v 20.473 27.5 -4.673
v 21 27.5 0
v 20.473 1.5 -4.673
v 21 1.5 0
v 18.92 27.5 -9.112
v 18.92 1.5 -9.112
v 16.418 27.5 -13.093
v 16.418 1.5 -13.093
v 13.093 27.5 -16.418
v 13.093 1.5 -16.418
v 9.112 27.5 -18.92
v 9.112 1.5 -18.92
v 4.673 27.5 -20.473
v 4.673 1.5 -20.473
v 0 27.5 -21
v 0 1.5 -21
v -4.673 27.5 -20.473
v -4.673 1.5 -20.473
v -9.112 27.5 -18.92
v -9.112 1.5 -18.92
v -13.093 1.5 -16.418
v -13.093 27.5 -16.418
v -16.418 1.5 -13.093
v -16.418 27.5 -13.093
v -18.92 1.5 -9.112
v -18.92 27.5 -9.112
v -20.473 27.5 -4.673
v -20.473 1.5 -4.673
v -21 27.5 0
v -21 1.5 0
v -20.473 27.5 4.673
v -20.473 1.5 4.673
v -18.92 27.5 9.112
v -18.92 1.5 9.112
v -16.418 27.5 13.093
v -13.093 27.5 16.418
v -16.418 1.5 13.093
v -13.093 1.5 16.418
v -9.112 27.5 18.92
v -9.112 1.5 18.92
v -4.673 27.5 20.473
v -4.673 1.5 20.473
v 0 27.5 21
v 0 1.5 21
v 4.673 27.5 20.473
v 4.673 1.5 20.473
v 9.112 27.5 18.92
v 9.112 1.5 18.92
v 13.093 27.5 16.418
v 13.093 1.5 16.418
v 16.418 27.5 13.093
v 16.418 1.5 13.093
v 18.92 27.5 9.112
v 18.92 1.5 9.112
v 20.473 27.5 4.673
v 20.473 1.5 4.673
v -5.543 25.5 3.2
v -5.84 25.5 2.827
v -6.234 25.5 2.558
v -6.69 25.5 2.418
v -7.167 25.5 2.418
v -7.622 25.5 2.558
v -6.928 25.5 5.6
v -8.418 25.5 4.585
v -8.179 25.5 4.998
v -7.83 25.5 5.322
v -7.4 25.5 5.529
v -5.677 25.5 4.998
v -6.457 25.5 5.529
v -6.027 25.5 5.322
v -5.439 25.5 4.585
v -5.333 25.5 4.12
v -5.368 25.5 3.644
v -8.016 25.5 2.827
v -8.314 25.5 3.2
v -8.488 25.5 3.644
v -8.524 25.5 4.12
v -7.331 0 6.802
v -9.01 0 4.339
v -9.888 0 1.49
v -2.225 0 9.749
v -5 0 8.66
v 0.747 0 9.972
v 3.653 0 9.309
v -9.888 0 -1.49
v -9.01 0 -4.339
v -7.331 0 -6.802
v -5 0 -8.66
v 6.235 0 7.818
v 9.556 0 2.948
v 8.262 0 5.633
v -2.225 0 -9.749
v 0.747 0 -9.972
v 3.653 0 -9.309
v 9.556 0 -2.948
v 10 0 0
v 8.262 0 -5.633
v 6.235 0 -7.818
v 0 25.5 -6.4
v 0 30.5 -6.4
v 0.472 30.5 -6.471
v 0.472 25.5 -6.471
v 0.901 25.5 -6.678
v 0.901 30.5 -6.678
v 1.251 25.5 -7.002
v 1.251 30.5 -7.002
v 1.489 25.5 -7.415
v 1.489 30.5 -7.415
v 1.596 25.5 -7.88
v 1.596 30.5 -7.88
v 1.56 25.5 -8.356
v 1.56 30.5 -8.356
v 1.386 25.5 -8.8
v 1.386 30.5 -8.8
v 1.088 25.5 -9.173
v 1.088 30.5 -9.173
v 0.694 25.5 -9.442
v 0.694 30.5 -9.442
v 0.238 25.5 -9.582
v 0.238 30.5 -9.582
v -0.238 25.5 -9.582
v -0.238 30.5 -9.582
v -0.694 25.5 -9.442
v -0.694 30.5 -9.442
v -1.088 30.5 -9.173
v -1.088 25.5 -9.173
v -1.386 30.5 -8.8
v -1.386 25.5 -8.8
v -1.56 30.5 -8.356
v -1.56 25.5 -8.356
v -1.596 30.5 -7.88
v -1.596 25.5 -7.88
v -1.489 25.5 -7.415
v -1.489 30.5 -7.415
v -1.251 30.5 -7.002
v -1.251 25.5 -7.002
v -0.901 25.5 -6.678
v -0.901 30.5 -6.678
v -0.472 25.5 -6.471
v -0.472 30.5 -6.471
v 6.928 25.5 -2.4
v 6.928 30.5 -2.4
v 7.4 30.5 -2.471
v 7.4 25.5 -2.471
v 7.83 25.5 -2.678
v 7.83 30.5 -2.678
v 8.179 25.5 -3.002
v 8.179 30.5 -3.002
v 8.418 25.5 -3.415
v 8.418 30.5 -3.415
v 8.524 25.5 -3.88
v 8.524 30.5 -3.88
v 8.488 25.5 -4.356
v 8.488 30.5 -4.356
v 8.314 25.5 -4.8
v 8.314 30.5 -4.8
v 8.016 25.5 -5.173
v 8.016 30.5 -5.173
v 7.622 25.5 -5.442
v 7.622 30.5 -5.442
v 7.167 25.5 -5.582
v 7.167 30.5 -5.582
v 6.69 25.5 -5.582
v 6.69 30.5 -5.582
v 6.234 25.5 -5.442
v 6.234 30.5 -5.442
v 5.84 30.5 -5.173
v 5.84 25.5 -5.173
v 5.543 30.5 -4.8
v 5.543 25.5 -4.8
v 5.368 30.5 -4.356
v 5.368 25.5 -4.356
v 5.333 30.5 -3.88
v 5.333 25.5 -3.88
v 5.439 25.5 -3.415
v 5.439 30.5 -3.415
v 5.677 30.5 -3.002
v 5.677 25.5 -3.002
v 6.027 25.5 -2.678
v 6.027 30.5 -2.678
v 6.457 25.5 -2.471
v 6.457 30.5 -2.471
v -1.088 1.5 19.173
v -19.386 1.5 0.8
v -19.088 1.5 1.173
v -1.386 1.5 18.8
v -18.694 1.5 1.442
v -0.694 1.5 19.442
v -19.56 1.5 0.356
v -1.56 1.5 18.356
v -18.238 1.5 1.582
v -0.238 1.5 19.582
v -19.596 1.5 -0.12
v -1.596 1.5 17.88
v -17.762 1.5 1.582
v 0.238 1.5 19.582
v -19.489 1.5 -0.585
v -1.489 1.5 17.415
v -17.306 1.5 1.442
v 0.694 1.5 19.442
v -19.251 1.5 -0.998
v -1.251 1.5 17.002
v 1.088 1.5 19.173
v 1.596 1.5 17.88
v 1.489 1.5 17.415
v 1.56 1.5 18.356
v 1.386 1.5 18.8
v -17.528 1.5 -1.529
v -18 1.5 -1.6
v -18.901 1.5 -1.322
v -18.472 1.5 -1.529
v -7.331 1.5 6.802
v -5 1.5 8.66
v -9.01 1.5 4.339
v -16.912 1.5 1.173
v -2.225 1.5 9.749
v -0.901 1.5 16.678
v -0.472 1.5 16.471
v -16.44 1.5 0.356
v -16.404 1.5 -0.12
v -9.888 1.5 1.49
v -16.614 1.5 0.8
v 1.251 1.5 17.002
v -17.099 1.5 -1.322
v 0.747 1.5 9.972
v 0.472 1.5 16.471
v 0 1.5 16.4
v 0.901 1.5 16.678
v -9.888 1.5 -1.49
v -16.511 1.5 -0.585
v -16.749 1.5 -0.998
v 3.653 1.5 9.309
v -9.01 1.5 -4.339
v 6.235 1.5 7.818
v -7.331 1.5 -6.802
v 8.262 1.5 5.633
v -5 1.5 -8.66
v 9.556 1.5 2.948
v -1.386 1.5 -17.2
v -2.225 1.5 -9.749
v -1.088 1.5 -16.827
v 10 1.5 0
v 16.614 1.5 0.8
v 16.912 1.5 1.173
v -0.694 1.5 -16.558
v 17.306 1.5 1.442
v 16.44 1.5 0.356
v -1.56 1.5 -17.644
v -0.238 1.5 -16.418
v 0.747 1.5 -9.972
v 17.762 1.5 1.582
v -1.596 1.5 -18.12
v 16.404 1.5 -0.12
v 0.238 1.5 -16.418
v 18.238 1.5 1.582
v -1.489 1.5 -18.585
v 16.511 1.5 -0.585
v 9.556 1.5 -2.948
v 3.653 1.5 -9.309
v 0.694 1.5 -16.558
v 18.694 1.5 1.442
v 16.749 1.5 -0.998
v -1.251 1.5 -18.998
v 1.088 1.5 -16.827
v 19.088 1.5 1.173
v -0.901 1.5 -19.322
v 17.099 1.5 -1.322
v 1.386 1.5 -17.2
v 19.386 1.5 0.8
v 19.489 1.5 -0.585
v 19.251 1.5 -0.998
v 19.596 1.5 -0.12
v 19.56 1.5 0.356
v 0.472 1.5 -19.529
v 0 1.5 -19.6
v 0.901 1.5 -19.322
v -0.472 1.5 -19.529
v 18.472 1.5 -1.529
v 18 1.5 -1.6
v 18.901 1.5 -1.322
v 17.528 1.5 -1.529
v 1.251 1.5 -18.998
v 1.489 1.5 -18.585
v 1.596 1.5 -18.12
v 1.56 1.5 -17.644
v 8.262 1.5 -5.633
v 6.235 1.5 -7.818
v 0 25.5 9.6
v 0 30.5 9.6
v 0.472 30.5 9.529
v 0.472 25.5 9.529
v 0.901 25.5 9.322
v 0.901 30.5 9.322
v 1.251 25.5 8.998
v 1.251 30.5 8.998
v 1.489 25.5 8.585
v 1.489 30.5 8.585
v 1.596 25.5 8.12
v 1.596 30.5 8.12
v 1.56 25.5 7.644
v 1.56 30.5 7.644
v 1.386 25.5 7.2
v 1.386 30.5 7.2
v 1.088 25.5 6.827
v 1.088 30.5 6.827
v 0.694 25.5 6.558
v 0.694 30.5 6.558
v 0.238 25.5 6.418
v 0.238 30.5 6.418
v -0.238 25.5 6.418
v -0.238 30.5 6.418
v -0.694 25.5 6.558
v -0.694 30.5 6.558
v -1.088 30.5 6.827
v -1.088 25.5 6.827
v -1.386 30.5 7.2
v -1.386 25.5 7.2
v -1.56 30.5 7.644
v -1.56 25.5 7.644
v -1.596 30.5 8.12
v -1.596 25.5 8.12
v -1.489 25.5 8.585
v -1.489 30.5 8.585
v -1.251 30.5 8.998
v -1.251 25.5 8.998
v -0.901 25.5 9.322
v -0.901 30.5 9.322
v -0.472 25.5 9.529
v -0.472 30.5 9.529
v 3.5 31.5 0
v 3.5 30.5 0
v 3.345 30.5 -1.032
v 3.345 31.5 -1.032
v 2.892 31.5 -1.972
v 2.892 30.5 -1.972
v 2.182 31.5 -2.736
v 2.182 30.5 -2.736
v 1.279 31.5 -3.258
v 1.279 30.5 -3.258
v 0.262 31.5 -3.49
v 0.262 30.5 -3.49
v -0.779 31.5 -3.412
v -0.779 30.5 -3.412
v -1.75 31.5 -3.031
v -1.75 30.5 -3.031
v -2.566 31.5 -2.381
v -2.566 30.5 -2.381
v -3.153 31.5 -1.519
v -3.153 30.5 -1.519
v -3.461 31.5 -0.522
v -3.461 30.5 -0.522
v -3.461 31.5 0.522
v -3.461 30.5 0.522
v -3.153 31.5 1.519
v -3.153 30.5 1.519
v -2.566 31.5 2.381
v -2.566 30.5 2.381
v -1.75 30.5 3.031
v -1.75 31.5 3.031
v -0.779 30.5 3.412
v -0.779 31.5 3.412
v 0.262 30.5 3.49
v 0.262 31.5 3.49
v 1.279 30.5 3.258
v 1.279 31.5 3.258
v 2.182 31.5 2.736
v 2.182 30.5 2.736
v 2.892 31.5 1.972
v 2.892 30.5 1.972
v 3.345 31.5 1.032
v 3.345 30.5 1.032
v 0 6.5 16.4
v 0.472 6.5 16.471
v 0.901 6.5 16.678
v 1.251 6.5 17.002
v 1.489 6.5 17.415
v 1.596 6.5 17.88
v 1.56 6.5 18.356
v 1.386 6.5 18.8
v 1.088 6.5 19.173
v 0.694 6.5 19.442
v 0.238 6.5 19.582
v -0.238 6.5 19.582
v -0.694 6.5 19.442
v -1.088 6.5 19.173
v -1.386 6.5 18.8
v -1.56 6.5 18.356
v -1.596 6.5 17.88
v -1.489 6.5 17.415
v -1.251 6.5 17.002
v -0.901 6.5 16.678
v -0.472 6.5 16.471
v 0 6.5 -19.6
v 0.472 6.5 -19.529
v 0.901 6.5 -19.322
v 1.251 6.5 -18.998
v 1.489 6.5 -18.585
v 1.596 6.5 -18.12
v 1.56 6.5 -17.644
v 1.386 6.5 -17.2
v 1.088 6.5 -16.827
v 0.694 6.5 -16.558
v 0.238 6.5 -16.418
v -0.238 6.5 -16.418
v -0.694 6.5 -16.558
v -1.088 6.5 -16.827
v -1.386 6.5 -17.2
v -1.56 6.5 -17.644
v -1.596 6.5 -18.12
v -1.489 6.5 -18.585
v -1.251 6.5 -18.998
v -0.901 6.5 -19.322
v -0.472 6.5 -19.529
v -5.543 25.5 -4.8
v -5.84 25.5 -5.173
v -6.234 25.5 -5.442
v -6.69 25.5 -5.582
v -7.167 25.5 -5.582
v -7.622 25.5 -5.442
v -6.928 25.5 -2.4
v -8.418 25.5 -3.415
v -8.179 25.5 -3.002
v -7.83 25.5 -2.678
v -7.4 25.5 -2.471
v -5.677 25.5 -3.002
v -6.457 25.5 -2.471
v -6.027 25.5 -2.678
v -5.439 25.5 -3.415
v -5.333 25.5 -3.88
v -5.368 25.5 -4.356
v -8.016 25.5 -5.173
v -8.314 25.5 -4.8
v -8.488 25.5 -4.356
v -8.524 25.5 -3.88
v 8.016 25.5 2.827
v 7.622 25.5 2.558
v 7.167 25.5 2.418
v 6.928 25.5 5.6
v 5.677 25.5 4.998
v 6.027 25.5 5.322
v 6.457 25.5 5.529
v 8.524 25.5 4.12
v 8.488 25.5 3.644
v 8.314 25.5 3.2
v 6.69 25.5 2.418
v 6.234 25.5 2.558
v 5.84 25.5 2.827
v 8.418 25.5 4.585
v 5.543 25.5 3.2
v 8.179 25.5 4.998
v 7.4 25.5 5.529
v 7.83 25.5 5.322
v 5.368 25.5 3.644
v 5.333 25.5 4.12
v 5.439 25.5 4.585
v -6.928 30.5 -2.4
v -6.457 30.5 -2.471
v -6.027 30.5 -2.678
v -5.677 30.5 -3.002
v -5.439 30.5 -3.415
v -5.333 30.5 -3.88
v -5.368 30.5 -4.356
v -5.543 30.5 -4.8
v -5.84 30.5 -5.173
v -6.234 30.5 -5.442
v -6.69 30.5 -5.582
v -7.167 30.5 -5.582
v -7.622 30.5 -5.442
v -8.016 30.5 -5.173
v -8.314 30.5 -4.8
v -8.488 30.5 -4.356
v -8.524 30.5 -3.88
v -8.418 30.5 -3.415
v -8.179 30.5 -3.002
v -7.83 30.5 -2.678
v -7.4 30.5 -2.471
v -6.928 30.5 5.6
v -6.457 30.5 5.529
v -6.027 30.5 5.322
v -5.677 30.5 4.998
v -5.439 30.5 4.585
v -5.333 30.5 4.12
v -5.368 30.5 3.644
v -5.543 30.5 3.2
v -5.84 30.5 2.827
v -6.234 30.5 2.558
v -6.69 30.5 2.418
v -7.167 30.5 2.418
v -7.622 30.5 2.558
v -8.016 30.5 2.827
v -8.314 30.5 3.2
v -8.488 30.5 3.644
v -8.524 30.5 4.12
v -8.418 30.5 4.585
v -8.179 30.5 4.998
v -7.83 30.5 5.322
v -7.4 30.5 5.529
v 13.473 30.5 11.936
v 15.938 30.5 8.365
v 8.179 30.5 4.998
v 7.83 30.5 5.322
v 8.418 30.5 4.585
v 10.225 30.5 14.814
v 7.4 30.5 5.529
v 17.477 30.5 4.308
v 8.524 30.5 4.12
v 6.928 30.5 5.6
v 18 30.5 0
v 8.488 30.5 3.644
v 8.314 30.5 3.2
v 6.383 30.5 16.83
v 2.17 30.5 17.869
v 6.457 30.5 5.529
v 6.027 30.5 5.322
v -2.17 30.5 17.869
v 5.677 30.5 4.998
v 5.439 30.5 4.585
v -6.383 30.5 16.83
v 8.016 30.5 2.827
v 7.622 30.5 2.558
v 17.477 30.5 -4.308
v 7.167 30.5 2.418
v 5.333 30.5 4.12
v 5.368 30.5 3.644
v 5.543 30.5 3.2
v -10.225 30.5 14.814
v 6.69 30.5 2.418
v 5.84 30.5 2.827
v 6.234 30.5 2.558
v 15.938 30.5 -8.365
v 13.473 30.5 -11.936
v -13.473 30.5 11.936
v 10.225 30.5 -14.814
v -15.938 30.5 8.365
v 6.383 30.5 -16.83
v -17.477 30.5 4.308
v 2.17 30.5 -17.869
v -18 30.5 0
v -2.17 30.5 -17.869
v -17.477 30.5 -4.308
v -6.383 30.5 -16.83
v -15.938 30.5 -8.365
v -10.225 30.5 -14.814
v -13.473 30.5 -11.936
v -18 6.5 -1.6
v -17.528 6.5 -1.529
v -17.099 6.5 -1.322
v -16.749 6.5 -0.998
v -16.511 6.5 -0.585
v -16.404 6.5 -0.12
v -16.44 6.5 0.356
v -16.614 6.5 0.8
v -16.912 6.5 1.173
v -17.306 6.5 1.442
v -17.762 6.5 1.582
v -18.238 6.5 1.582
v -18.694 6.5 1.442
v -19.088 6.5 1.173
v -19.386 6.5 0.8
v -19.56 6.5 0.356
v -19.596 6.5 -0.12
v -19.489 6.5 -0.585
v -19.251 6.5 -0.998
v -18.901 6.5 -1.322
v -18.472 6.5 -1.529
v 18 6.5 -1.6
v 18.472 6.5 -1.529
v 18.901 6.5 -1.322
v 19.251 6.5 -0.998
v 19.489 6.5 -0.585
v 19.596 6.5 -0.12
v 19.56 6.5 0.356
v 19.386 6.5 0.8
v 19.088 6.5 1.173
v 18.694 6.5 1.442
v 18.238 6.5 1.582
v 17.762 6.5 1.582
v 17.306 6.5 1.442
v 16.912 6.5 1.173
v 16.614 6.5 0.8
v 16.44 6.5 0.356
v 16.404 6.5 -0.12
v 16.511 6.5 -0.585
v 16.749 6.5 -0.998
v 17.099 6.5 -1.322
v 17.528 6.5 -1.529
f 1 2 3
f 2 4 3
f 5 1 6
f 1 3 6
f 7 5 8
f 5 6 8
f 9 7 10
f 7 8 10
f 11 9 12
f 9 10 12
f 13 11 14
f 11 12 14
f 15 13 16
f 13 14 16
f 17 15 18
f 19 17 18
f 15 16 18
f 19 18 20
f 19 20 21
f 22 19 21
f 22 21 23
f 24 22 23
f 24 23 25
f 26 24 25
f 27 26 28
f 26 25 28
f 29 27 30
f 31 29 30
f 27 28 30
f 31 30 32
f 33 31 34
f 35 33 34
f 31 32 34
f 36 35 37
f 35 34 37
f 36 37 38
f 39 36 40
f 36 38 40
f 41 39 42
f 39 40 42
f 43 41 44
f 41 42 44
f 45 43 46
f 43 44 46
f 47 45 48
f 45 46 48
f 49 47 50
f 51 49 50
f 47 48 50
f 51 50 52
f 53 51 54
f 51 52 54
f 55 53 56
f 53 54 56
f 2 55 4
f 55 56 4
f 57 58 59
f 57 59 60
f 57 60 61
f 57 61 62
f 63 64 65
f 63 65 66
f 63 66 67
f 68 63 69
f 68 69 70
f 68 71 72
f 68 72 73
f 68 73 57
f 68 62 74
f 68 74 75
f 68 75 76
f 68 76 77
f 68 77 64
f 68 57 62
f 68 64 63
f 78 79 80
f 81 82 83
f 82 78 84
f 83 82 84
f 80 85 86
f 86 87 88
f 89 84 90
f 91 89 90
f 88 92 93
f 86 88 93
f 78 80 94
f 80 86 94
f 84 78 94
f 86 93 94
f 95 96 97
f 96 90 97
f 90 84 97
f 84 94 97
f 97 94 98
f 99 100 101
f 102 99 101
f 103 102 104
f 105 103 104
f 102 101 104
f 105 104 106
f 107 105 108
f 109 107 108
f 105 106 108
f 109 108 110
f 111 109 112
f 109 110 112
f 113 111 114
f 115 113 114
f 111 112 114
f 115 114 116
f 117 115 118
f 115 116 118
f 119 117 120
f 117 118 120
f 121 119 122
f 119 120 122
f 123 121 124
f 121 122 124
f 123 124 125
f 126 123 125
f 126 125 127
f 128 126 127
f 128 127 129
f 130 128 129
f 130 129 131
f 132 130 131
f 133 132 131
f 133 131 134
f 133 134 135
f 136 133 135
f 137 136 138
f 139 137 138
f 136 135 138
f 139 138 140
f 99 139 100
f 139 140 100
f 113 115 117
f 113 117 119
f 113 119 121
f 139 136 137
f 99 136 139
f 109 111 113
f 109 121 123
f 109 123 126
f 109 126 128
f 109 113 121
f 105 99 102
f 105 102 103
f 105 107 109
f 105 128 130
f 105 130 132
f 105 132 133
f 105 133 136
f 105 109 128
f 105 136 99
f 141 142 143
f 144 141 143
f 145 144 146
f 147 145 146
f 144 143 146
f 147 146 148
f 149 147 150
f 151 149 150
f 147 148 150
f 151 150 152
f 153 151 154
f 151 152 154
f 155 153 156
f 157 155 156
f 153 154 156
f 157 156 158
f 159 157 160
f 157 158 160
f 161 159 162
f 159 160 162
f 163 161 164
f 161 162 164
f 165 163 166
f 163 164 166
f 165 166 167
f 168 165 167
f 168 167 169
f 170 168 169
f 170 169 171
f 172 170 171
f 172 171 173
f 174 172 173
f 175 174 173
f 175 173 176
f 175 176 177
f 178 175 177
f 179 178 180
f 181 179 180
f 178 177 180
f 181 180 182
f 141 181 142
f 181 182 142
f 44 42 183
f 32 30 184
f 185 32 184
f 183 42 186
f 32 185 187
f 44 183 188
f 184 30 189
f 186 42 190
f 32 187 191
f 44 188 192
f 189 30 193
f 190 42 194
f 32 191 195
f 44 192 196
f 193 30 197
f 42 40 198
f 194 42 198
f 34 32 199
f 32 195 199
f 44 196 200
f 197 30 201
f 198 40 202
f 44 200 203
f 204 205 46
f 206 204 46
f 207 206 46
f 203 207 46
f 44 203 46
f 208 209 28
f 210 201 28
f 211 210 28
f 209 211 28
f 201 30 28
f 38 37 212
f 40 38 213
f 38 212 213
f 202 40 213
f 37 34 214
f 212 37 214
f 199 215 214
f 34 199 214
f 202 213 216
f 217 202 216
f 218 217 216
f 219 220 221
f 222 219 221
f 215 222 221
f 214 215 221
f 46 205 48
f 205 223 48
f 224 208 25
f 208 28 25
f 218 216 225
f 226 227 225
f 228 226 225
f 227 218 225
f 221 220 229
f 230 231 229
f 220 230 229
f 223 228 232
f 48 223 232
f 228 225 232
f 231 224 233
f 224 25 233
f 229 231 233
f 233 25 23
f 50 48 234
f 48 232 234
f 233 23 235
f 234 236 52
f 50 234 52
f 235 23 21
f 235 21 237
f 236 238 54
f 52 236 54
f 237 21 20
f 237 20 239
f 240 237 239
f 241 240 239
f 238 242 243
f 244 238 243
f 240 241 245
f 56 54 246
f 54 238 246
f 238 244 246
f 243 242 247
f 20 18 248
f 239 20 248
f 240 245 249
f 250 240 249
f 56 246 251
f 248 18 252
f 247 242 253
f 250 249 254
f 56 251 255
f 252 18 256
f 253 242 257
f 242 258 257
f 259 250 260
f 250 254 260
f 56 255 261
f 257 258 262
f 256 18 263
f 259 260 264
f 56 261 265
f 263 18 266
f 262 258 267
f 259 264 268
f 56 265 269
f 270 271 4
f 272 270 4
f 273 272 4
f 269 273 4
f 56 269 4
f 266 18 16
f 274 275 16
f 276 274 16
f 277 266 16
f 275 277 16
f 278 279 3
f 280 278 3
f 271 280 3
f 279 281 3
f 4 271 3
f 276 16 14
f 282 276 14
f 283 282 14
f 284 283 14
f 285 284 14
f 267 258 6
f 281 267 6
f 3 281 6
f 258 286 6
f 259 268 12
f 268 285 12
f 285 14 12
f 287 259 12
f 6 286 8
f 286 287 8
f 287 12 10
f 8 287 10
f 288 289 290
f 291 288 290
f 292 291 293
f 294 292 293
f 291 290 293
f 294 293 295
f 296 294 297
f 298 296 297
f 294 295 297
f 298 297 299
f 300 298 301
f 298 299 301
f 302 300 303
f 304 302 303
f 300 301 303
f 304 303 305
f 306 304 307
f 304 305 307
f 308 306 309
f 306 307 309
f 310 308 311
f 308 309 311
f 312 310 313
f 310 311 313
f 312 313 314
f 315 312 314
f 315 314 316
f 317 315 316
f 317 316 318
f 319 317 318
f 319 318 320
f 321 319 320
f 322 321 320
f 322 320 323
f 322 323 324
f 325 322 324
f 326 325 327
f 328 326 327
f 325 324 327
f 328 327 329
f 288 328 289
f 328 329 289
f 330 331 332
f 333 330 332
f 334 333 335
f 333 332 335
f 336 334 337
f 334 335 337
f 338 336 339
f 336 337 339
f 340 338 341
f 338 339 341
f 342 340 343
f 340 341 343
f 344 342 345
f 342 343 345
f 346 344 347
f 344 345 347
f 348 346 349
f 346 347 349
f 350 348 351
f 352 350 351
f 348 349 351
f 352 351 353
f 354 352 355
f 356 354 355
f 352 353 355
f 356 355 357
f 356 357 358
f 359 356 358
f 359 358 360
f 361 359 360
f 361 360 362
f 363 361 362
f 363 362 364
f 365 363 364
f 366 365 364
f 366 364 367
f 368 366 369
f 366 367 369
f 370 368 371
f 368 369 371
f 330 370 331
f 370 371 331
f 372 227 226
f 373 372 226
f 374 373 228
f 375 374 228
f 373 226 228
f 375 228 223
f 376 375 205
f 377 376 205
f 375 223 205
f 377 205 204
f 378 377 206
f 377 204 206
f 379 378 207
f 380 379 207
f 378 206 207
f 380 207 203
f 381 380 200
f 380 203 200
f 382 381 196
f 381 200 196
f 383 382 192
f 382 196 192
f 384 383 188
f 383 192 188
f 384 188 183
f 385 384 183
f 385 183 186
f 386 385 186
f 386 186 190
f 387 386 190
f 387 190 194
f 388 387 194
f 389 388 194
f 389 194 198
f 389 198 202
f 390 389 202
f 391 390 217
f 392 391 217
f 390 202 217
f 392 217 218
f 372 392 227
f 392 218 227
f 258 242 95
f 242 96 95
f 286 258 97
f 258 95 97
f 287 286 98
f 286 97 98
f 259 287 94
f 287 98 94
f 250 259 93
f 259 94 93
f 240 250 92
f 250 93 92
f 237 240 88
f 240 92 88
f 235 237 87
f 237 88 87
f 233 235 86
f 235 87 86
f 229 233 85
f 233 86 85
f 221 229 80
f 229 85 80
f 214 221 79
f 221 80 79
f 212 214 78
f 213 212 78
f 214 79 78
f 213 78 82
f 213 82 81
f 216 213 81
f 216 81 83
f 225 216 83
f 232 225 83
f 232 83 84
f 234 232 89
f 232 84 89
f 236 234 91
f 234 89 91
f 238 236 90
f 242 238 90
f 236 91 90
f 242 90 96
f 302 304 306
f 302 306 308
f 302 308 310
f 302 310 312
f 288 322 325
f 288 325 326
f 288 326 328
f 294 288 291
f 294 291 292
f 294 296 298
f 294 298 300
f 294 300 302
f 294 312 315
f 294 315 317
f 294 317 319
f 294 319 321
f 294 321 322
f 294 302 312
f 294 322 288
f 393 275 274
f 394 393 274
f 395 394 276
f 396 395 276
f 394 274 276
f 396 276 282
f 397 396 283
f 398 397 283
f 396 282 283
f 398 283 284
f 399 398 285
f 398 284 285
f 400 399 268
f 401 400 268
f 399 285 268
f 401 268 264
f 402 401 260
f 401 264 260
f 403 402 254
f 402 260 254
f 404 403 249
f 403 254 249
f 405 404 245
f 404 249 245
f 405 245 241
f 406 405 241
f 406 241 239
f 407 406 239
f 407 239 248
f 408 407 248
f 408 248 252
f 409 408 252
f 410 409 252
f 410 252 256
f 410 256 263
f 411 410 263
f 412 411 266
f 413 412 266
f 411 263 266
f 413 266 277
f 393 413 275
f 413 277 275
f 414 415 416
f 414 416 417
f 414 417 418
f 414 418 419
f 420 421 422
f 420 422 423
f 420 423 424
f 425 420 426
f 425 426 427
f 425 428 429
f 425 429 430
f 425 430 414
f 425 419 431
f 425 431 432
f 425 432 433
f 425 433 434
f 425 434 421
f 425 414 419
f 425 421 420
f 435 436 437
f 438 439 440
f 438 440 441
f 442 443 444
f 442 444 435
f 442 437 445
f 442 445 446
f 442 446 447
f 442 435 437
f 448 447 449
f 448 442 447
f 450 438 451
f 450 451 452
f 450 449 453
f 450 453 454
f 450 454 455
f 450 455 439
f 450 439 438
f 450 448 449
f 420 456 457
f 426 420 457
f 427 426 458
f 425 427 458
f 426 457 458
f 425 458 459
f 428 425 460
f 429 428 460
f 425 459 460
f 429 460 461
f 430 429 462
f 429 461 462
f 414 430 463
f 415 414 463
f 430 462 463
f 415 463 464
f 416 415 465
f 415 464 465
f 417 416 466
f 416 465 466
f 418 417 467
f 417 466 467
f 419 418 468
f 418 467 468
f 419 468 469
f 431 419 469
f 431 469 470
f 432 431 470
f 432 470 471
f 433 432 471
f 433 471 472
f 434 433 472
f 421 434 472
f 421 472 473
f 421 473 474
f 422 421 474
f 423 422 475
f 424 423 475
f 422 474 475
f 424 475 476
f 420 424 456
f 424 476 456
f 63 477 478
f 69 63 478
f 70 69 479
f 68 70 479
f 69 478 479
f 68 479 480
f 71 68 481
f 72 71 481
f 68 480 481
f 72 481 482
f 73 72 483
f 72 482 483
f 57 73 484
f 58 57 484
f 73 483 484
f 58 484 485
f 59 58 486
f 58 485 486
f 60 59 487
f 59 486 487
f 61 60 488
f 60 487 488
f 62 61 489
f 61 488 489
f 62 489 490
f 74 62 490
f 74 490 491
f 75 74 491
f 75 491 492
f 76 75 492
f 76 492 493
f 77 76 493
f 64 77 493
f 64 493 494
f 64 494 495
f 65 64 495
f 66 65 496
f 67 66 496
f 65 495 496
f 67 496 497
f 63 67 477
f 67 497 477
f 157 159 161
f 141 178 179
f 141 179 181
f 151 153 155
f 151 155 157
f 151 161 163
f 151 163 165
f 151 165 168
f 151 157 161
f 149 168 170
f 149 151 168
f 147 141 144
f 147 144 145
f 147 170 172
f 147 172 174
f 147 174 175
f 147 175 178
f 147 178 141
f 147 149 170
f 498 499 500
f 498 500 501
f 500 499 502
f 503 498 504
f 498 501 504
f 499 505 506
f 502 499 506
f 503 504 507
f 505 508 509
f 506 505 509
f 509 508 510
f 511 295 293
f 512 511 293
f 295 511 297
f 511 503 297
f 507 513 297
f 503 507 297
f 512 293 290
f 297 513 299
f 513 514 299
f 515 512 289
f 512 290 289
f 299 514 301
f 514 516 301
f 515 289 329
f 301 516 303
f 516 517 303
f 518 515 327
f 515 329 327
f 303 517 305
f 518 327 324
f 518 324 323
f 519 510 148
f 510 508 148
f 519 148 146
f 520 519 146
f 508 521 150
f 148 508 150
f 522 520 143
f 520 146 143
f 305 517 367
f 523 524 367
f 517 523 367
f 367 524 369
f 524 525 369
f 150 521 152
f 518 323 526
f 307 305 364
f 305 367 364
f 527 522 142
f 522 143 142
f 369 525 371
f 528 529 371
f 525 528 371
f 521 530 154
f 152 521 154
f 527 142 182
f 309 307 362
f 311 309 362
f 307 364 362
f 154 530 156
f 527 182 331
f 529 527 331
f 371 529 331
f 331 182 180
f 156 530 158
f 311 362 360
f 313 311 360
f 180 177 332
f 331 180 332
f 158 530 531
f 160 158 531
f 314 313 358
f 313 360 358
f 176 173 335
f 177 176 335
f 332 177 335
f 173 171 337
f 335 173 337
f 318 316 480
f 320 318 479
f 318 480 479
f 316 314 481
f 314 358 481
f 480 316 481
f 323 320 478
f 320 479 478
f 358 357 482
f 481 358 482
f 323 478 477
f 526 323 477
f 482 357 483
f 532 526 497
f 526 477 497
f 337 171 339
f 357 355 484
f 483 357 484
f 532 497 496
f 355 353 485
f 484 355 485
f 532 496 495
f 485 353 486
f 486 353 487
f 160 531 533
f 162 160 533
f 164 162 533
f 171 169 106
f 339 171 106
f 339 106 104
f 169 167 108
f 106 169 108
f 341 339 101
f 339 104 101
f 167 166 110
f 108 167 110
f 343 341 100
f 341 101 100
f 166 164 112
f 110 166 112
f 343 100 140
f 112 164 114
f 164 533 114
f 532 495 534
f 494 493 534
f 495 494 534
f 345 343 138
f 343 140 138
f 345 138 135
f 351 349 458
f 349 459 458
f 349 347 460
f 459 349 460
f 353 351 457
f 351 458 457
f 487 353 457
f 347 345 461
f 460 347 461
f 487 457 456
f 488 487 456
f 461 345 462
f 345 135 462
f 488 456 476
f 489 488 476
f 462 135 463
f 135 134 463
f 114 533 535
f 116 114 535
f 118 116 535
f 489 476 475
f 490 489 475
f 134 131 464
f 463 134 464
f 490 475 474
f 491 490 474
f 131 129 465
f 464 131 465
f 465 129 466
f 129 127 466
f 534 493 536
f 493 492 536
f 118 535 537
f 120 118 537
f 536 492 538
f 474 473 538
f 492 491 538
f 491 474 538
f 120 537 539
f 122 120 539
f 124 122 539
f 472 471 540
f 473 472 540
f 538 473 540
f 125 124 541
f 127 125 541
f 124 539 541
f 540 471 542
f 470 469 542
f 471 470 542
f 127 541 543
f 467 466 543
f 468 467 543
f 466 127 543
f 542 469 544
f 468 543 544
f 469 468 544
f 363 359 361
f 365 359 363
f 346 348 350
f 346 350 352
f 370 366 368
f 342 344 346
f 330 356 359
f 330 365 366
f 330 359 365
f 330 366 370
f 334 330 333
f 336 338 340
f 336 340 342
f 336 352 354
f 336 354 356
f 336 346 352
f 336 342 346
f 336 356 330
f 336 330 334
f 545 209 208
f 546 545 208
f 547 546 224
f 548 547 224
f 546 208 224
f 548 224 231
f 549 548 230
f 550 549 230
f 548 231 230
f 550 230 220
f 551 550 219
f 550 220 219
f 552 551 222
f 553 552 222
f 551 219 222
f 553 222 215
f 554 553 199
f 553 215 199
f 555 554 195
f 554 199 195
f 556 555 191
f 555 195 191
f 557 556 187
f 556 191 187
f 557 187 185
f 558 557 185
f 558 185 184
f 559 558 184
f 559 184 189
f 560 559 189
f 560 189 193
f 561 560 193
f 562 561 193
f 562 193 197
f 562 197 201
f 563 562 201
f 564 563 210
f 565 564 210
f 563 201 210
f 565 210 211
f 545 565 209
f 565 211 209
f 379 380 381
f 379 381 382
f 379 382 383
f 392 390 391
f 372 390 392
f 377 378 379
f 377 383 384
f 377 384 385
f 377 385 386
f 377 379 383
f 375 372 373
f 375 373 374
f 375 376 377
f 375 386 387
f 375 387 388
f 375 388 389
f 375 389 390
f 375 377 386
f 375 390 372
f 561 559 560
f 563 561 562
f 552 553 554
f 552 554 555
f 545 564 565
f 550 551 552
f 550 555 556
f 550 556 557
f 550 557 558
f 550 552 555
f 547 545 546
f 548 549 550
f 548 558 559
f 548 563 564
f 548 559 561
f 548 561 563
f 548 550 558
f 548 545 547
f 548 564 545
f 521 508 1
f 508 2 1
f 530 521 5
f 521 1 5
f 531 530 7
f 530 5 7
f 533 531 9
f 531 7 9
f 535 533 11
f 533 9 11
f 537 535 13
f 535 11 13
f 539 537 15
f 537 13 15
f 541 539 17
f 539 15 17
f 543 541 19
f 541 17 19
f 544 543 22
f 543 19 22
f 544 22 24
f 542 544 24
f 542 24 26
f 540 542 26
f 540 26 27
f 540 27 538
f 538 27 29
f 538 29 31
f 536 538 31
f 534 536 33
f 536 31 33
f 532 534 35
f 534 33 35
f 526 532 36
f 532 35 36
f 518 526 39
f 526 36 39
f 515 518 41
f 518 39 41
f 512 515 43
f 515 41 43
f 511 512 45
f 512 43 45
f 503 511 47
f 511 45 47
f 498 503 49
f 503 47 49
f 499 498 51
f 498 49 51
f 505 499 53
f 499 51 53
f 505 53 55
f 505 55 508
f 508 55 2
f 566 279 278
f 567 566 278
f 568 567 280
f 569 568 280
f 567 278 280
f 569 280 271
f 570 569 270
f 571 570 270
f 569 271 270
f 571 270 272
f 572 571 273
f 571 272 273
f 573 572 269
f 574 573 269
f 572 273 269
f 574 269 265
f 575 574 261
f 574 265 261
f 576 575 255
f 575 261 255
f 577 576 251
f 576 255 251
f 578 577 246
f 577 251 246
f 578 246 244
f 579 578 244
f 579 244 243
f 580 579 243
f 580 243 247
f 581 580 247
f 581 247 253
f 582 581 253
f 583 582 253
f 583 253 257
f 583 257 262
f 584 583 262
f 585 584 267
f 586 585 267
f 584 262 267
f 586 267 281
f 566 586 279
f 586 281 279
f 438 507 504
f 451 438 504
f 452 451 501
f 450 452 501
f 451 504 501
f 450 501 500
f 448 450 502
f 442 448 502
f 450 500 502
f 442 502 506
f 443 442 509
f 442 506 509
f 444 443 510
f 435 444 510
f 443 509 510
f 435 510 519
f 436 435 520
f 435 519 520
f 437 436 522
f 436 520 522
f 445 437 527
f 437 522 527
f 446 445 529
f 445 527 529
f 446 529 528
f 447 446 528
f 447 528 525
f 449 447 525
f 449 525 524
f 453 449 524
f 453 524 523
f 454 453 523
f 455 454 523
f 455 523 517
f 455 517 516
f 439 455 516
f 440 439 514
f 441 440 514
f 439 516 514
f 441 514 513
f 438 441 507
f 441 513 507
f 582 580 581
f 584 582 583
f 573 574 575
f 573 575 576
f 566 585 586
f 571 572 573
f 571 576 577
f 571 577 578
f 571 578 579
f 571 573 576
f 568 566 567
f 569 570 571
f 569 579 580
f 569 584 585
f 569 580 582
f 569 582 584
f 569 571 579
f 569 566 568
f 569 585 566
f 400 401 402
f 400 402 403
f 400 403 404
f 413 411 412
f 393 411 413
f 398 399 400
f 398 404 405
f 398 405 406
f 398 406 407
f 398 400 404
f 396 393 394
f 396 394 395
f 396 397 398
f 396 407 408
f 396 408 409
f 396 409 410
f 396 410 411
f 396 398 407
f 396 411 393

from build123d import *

# Parameters (mm, degrees)
SKETCH_5_R          = 1.6
CUT_EXTRUDE_1_DEPTH = 5
SKETCH_6_R          = 1.6
CUT_EXTRUDE_2_DEPTH = 5
SKETCH_7_R          = 3.5
EXTRUDE_1_DEPTH     = 1


with BuildPart() as part:
    # 草图4 → 旋转1 (revolve)
    with BuildSketch(Plane.XY, mode=Mode.PRIVATE) as revolve_1_sk:
        Polygon((0, 30.5), (-18, 30.5), (-21, 27.5), (-21, 1.5), (-10, 1.5), (-10, 0), (0, 0), align=None)
    revolve(revolve_1_sk.sketch.rotate(Axis((0, 0, 0), (0, 1, 0)), 180), axis=Axis((0, 0, 0), (0, 1, 0)))

    # 草图5 → 切除-拉伸1 (cut)
    with BuildSketch(Plane(origin=(0, 30.5, 0), x_dir=(1, 0, 0), z_dir=(0, 1, 0))):
        with Locations(Location((0, 8, 0), (0, 0, 270))):
            Circle(SKETCH_5_R)
        with Locations(Location((6.92820323, 4, 0), (0, 0, 270))):
            Circle(SKETCH_5_R)
        with Locations(Location((6.92820323, -4, 0), (0, 0, 270))):
            Circle(SKETCH_5_R)
        with Locations(Location((0, -8, 0), (0, 0, 270))):
            Circle(SKETCH_5_R)
        with Locations(Location((-6.92820323, -4, 0), (0, 0, 270))):
            Circle(SKETCH_5_R)
        with Locations(Location((-6.92820323, 4, 0), (0, 0, 270))):
            Circle(SKETCH_5_R)
    extrude(amount=-CUT_EXTRUDE_1_DEPTH, mode=Mode.SUBTRACT)

    # 草图6 → 切除-拉伸2 (cut)
    with BuildSketch(Plane.XZ.offset(-1.5)):
        with Locations(Location((0, 18, 0), (0, 0, 270))):
            Circle(SKETCH_6_R)
        with Locations(Location((18, 0, 0), (0, 0, 270))):
            Circle(SKETCH_6_R)
        with Locations(Location((0, -18, 0), (0, 0, 270))):
            Circle(SKETCH_6_R)
        with Locations(Location((-18, 0, 0), (0, 0, 270))):
            Circle(SKETCH_6_R)
    extrude(amount=-CUT_EXTRUDE_2_DEPTH, mode=Mode.SUBTRACT)

    # 草图7 → 凸台-拉伸1 (add)
    with BuildSketch(Plane(origin=(0, 30.5, 0), x_dir=(1, 0, 0), z_dir=(0, 1, 0))):
        Circle(SKETCH_7_R)
    extrude(amount=EXTRUDE_1_DEPTH)


solid = part.part
